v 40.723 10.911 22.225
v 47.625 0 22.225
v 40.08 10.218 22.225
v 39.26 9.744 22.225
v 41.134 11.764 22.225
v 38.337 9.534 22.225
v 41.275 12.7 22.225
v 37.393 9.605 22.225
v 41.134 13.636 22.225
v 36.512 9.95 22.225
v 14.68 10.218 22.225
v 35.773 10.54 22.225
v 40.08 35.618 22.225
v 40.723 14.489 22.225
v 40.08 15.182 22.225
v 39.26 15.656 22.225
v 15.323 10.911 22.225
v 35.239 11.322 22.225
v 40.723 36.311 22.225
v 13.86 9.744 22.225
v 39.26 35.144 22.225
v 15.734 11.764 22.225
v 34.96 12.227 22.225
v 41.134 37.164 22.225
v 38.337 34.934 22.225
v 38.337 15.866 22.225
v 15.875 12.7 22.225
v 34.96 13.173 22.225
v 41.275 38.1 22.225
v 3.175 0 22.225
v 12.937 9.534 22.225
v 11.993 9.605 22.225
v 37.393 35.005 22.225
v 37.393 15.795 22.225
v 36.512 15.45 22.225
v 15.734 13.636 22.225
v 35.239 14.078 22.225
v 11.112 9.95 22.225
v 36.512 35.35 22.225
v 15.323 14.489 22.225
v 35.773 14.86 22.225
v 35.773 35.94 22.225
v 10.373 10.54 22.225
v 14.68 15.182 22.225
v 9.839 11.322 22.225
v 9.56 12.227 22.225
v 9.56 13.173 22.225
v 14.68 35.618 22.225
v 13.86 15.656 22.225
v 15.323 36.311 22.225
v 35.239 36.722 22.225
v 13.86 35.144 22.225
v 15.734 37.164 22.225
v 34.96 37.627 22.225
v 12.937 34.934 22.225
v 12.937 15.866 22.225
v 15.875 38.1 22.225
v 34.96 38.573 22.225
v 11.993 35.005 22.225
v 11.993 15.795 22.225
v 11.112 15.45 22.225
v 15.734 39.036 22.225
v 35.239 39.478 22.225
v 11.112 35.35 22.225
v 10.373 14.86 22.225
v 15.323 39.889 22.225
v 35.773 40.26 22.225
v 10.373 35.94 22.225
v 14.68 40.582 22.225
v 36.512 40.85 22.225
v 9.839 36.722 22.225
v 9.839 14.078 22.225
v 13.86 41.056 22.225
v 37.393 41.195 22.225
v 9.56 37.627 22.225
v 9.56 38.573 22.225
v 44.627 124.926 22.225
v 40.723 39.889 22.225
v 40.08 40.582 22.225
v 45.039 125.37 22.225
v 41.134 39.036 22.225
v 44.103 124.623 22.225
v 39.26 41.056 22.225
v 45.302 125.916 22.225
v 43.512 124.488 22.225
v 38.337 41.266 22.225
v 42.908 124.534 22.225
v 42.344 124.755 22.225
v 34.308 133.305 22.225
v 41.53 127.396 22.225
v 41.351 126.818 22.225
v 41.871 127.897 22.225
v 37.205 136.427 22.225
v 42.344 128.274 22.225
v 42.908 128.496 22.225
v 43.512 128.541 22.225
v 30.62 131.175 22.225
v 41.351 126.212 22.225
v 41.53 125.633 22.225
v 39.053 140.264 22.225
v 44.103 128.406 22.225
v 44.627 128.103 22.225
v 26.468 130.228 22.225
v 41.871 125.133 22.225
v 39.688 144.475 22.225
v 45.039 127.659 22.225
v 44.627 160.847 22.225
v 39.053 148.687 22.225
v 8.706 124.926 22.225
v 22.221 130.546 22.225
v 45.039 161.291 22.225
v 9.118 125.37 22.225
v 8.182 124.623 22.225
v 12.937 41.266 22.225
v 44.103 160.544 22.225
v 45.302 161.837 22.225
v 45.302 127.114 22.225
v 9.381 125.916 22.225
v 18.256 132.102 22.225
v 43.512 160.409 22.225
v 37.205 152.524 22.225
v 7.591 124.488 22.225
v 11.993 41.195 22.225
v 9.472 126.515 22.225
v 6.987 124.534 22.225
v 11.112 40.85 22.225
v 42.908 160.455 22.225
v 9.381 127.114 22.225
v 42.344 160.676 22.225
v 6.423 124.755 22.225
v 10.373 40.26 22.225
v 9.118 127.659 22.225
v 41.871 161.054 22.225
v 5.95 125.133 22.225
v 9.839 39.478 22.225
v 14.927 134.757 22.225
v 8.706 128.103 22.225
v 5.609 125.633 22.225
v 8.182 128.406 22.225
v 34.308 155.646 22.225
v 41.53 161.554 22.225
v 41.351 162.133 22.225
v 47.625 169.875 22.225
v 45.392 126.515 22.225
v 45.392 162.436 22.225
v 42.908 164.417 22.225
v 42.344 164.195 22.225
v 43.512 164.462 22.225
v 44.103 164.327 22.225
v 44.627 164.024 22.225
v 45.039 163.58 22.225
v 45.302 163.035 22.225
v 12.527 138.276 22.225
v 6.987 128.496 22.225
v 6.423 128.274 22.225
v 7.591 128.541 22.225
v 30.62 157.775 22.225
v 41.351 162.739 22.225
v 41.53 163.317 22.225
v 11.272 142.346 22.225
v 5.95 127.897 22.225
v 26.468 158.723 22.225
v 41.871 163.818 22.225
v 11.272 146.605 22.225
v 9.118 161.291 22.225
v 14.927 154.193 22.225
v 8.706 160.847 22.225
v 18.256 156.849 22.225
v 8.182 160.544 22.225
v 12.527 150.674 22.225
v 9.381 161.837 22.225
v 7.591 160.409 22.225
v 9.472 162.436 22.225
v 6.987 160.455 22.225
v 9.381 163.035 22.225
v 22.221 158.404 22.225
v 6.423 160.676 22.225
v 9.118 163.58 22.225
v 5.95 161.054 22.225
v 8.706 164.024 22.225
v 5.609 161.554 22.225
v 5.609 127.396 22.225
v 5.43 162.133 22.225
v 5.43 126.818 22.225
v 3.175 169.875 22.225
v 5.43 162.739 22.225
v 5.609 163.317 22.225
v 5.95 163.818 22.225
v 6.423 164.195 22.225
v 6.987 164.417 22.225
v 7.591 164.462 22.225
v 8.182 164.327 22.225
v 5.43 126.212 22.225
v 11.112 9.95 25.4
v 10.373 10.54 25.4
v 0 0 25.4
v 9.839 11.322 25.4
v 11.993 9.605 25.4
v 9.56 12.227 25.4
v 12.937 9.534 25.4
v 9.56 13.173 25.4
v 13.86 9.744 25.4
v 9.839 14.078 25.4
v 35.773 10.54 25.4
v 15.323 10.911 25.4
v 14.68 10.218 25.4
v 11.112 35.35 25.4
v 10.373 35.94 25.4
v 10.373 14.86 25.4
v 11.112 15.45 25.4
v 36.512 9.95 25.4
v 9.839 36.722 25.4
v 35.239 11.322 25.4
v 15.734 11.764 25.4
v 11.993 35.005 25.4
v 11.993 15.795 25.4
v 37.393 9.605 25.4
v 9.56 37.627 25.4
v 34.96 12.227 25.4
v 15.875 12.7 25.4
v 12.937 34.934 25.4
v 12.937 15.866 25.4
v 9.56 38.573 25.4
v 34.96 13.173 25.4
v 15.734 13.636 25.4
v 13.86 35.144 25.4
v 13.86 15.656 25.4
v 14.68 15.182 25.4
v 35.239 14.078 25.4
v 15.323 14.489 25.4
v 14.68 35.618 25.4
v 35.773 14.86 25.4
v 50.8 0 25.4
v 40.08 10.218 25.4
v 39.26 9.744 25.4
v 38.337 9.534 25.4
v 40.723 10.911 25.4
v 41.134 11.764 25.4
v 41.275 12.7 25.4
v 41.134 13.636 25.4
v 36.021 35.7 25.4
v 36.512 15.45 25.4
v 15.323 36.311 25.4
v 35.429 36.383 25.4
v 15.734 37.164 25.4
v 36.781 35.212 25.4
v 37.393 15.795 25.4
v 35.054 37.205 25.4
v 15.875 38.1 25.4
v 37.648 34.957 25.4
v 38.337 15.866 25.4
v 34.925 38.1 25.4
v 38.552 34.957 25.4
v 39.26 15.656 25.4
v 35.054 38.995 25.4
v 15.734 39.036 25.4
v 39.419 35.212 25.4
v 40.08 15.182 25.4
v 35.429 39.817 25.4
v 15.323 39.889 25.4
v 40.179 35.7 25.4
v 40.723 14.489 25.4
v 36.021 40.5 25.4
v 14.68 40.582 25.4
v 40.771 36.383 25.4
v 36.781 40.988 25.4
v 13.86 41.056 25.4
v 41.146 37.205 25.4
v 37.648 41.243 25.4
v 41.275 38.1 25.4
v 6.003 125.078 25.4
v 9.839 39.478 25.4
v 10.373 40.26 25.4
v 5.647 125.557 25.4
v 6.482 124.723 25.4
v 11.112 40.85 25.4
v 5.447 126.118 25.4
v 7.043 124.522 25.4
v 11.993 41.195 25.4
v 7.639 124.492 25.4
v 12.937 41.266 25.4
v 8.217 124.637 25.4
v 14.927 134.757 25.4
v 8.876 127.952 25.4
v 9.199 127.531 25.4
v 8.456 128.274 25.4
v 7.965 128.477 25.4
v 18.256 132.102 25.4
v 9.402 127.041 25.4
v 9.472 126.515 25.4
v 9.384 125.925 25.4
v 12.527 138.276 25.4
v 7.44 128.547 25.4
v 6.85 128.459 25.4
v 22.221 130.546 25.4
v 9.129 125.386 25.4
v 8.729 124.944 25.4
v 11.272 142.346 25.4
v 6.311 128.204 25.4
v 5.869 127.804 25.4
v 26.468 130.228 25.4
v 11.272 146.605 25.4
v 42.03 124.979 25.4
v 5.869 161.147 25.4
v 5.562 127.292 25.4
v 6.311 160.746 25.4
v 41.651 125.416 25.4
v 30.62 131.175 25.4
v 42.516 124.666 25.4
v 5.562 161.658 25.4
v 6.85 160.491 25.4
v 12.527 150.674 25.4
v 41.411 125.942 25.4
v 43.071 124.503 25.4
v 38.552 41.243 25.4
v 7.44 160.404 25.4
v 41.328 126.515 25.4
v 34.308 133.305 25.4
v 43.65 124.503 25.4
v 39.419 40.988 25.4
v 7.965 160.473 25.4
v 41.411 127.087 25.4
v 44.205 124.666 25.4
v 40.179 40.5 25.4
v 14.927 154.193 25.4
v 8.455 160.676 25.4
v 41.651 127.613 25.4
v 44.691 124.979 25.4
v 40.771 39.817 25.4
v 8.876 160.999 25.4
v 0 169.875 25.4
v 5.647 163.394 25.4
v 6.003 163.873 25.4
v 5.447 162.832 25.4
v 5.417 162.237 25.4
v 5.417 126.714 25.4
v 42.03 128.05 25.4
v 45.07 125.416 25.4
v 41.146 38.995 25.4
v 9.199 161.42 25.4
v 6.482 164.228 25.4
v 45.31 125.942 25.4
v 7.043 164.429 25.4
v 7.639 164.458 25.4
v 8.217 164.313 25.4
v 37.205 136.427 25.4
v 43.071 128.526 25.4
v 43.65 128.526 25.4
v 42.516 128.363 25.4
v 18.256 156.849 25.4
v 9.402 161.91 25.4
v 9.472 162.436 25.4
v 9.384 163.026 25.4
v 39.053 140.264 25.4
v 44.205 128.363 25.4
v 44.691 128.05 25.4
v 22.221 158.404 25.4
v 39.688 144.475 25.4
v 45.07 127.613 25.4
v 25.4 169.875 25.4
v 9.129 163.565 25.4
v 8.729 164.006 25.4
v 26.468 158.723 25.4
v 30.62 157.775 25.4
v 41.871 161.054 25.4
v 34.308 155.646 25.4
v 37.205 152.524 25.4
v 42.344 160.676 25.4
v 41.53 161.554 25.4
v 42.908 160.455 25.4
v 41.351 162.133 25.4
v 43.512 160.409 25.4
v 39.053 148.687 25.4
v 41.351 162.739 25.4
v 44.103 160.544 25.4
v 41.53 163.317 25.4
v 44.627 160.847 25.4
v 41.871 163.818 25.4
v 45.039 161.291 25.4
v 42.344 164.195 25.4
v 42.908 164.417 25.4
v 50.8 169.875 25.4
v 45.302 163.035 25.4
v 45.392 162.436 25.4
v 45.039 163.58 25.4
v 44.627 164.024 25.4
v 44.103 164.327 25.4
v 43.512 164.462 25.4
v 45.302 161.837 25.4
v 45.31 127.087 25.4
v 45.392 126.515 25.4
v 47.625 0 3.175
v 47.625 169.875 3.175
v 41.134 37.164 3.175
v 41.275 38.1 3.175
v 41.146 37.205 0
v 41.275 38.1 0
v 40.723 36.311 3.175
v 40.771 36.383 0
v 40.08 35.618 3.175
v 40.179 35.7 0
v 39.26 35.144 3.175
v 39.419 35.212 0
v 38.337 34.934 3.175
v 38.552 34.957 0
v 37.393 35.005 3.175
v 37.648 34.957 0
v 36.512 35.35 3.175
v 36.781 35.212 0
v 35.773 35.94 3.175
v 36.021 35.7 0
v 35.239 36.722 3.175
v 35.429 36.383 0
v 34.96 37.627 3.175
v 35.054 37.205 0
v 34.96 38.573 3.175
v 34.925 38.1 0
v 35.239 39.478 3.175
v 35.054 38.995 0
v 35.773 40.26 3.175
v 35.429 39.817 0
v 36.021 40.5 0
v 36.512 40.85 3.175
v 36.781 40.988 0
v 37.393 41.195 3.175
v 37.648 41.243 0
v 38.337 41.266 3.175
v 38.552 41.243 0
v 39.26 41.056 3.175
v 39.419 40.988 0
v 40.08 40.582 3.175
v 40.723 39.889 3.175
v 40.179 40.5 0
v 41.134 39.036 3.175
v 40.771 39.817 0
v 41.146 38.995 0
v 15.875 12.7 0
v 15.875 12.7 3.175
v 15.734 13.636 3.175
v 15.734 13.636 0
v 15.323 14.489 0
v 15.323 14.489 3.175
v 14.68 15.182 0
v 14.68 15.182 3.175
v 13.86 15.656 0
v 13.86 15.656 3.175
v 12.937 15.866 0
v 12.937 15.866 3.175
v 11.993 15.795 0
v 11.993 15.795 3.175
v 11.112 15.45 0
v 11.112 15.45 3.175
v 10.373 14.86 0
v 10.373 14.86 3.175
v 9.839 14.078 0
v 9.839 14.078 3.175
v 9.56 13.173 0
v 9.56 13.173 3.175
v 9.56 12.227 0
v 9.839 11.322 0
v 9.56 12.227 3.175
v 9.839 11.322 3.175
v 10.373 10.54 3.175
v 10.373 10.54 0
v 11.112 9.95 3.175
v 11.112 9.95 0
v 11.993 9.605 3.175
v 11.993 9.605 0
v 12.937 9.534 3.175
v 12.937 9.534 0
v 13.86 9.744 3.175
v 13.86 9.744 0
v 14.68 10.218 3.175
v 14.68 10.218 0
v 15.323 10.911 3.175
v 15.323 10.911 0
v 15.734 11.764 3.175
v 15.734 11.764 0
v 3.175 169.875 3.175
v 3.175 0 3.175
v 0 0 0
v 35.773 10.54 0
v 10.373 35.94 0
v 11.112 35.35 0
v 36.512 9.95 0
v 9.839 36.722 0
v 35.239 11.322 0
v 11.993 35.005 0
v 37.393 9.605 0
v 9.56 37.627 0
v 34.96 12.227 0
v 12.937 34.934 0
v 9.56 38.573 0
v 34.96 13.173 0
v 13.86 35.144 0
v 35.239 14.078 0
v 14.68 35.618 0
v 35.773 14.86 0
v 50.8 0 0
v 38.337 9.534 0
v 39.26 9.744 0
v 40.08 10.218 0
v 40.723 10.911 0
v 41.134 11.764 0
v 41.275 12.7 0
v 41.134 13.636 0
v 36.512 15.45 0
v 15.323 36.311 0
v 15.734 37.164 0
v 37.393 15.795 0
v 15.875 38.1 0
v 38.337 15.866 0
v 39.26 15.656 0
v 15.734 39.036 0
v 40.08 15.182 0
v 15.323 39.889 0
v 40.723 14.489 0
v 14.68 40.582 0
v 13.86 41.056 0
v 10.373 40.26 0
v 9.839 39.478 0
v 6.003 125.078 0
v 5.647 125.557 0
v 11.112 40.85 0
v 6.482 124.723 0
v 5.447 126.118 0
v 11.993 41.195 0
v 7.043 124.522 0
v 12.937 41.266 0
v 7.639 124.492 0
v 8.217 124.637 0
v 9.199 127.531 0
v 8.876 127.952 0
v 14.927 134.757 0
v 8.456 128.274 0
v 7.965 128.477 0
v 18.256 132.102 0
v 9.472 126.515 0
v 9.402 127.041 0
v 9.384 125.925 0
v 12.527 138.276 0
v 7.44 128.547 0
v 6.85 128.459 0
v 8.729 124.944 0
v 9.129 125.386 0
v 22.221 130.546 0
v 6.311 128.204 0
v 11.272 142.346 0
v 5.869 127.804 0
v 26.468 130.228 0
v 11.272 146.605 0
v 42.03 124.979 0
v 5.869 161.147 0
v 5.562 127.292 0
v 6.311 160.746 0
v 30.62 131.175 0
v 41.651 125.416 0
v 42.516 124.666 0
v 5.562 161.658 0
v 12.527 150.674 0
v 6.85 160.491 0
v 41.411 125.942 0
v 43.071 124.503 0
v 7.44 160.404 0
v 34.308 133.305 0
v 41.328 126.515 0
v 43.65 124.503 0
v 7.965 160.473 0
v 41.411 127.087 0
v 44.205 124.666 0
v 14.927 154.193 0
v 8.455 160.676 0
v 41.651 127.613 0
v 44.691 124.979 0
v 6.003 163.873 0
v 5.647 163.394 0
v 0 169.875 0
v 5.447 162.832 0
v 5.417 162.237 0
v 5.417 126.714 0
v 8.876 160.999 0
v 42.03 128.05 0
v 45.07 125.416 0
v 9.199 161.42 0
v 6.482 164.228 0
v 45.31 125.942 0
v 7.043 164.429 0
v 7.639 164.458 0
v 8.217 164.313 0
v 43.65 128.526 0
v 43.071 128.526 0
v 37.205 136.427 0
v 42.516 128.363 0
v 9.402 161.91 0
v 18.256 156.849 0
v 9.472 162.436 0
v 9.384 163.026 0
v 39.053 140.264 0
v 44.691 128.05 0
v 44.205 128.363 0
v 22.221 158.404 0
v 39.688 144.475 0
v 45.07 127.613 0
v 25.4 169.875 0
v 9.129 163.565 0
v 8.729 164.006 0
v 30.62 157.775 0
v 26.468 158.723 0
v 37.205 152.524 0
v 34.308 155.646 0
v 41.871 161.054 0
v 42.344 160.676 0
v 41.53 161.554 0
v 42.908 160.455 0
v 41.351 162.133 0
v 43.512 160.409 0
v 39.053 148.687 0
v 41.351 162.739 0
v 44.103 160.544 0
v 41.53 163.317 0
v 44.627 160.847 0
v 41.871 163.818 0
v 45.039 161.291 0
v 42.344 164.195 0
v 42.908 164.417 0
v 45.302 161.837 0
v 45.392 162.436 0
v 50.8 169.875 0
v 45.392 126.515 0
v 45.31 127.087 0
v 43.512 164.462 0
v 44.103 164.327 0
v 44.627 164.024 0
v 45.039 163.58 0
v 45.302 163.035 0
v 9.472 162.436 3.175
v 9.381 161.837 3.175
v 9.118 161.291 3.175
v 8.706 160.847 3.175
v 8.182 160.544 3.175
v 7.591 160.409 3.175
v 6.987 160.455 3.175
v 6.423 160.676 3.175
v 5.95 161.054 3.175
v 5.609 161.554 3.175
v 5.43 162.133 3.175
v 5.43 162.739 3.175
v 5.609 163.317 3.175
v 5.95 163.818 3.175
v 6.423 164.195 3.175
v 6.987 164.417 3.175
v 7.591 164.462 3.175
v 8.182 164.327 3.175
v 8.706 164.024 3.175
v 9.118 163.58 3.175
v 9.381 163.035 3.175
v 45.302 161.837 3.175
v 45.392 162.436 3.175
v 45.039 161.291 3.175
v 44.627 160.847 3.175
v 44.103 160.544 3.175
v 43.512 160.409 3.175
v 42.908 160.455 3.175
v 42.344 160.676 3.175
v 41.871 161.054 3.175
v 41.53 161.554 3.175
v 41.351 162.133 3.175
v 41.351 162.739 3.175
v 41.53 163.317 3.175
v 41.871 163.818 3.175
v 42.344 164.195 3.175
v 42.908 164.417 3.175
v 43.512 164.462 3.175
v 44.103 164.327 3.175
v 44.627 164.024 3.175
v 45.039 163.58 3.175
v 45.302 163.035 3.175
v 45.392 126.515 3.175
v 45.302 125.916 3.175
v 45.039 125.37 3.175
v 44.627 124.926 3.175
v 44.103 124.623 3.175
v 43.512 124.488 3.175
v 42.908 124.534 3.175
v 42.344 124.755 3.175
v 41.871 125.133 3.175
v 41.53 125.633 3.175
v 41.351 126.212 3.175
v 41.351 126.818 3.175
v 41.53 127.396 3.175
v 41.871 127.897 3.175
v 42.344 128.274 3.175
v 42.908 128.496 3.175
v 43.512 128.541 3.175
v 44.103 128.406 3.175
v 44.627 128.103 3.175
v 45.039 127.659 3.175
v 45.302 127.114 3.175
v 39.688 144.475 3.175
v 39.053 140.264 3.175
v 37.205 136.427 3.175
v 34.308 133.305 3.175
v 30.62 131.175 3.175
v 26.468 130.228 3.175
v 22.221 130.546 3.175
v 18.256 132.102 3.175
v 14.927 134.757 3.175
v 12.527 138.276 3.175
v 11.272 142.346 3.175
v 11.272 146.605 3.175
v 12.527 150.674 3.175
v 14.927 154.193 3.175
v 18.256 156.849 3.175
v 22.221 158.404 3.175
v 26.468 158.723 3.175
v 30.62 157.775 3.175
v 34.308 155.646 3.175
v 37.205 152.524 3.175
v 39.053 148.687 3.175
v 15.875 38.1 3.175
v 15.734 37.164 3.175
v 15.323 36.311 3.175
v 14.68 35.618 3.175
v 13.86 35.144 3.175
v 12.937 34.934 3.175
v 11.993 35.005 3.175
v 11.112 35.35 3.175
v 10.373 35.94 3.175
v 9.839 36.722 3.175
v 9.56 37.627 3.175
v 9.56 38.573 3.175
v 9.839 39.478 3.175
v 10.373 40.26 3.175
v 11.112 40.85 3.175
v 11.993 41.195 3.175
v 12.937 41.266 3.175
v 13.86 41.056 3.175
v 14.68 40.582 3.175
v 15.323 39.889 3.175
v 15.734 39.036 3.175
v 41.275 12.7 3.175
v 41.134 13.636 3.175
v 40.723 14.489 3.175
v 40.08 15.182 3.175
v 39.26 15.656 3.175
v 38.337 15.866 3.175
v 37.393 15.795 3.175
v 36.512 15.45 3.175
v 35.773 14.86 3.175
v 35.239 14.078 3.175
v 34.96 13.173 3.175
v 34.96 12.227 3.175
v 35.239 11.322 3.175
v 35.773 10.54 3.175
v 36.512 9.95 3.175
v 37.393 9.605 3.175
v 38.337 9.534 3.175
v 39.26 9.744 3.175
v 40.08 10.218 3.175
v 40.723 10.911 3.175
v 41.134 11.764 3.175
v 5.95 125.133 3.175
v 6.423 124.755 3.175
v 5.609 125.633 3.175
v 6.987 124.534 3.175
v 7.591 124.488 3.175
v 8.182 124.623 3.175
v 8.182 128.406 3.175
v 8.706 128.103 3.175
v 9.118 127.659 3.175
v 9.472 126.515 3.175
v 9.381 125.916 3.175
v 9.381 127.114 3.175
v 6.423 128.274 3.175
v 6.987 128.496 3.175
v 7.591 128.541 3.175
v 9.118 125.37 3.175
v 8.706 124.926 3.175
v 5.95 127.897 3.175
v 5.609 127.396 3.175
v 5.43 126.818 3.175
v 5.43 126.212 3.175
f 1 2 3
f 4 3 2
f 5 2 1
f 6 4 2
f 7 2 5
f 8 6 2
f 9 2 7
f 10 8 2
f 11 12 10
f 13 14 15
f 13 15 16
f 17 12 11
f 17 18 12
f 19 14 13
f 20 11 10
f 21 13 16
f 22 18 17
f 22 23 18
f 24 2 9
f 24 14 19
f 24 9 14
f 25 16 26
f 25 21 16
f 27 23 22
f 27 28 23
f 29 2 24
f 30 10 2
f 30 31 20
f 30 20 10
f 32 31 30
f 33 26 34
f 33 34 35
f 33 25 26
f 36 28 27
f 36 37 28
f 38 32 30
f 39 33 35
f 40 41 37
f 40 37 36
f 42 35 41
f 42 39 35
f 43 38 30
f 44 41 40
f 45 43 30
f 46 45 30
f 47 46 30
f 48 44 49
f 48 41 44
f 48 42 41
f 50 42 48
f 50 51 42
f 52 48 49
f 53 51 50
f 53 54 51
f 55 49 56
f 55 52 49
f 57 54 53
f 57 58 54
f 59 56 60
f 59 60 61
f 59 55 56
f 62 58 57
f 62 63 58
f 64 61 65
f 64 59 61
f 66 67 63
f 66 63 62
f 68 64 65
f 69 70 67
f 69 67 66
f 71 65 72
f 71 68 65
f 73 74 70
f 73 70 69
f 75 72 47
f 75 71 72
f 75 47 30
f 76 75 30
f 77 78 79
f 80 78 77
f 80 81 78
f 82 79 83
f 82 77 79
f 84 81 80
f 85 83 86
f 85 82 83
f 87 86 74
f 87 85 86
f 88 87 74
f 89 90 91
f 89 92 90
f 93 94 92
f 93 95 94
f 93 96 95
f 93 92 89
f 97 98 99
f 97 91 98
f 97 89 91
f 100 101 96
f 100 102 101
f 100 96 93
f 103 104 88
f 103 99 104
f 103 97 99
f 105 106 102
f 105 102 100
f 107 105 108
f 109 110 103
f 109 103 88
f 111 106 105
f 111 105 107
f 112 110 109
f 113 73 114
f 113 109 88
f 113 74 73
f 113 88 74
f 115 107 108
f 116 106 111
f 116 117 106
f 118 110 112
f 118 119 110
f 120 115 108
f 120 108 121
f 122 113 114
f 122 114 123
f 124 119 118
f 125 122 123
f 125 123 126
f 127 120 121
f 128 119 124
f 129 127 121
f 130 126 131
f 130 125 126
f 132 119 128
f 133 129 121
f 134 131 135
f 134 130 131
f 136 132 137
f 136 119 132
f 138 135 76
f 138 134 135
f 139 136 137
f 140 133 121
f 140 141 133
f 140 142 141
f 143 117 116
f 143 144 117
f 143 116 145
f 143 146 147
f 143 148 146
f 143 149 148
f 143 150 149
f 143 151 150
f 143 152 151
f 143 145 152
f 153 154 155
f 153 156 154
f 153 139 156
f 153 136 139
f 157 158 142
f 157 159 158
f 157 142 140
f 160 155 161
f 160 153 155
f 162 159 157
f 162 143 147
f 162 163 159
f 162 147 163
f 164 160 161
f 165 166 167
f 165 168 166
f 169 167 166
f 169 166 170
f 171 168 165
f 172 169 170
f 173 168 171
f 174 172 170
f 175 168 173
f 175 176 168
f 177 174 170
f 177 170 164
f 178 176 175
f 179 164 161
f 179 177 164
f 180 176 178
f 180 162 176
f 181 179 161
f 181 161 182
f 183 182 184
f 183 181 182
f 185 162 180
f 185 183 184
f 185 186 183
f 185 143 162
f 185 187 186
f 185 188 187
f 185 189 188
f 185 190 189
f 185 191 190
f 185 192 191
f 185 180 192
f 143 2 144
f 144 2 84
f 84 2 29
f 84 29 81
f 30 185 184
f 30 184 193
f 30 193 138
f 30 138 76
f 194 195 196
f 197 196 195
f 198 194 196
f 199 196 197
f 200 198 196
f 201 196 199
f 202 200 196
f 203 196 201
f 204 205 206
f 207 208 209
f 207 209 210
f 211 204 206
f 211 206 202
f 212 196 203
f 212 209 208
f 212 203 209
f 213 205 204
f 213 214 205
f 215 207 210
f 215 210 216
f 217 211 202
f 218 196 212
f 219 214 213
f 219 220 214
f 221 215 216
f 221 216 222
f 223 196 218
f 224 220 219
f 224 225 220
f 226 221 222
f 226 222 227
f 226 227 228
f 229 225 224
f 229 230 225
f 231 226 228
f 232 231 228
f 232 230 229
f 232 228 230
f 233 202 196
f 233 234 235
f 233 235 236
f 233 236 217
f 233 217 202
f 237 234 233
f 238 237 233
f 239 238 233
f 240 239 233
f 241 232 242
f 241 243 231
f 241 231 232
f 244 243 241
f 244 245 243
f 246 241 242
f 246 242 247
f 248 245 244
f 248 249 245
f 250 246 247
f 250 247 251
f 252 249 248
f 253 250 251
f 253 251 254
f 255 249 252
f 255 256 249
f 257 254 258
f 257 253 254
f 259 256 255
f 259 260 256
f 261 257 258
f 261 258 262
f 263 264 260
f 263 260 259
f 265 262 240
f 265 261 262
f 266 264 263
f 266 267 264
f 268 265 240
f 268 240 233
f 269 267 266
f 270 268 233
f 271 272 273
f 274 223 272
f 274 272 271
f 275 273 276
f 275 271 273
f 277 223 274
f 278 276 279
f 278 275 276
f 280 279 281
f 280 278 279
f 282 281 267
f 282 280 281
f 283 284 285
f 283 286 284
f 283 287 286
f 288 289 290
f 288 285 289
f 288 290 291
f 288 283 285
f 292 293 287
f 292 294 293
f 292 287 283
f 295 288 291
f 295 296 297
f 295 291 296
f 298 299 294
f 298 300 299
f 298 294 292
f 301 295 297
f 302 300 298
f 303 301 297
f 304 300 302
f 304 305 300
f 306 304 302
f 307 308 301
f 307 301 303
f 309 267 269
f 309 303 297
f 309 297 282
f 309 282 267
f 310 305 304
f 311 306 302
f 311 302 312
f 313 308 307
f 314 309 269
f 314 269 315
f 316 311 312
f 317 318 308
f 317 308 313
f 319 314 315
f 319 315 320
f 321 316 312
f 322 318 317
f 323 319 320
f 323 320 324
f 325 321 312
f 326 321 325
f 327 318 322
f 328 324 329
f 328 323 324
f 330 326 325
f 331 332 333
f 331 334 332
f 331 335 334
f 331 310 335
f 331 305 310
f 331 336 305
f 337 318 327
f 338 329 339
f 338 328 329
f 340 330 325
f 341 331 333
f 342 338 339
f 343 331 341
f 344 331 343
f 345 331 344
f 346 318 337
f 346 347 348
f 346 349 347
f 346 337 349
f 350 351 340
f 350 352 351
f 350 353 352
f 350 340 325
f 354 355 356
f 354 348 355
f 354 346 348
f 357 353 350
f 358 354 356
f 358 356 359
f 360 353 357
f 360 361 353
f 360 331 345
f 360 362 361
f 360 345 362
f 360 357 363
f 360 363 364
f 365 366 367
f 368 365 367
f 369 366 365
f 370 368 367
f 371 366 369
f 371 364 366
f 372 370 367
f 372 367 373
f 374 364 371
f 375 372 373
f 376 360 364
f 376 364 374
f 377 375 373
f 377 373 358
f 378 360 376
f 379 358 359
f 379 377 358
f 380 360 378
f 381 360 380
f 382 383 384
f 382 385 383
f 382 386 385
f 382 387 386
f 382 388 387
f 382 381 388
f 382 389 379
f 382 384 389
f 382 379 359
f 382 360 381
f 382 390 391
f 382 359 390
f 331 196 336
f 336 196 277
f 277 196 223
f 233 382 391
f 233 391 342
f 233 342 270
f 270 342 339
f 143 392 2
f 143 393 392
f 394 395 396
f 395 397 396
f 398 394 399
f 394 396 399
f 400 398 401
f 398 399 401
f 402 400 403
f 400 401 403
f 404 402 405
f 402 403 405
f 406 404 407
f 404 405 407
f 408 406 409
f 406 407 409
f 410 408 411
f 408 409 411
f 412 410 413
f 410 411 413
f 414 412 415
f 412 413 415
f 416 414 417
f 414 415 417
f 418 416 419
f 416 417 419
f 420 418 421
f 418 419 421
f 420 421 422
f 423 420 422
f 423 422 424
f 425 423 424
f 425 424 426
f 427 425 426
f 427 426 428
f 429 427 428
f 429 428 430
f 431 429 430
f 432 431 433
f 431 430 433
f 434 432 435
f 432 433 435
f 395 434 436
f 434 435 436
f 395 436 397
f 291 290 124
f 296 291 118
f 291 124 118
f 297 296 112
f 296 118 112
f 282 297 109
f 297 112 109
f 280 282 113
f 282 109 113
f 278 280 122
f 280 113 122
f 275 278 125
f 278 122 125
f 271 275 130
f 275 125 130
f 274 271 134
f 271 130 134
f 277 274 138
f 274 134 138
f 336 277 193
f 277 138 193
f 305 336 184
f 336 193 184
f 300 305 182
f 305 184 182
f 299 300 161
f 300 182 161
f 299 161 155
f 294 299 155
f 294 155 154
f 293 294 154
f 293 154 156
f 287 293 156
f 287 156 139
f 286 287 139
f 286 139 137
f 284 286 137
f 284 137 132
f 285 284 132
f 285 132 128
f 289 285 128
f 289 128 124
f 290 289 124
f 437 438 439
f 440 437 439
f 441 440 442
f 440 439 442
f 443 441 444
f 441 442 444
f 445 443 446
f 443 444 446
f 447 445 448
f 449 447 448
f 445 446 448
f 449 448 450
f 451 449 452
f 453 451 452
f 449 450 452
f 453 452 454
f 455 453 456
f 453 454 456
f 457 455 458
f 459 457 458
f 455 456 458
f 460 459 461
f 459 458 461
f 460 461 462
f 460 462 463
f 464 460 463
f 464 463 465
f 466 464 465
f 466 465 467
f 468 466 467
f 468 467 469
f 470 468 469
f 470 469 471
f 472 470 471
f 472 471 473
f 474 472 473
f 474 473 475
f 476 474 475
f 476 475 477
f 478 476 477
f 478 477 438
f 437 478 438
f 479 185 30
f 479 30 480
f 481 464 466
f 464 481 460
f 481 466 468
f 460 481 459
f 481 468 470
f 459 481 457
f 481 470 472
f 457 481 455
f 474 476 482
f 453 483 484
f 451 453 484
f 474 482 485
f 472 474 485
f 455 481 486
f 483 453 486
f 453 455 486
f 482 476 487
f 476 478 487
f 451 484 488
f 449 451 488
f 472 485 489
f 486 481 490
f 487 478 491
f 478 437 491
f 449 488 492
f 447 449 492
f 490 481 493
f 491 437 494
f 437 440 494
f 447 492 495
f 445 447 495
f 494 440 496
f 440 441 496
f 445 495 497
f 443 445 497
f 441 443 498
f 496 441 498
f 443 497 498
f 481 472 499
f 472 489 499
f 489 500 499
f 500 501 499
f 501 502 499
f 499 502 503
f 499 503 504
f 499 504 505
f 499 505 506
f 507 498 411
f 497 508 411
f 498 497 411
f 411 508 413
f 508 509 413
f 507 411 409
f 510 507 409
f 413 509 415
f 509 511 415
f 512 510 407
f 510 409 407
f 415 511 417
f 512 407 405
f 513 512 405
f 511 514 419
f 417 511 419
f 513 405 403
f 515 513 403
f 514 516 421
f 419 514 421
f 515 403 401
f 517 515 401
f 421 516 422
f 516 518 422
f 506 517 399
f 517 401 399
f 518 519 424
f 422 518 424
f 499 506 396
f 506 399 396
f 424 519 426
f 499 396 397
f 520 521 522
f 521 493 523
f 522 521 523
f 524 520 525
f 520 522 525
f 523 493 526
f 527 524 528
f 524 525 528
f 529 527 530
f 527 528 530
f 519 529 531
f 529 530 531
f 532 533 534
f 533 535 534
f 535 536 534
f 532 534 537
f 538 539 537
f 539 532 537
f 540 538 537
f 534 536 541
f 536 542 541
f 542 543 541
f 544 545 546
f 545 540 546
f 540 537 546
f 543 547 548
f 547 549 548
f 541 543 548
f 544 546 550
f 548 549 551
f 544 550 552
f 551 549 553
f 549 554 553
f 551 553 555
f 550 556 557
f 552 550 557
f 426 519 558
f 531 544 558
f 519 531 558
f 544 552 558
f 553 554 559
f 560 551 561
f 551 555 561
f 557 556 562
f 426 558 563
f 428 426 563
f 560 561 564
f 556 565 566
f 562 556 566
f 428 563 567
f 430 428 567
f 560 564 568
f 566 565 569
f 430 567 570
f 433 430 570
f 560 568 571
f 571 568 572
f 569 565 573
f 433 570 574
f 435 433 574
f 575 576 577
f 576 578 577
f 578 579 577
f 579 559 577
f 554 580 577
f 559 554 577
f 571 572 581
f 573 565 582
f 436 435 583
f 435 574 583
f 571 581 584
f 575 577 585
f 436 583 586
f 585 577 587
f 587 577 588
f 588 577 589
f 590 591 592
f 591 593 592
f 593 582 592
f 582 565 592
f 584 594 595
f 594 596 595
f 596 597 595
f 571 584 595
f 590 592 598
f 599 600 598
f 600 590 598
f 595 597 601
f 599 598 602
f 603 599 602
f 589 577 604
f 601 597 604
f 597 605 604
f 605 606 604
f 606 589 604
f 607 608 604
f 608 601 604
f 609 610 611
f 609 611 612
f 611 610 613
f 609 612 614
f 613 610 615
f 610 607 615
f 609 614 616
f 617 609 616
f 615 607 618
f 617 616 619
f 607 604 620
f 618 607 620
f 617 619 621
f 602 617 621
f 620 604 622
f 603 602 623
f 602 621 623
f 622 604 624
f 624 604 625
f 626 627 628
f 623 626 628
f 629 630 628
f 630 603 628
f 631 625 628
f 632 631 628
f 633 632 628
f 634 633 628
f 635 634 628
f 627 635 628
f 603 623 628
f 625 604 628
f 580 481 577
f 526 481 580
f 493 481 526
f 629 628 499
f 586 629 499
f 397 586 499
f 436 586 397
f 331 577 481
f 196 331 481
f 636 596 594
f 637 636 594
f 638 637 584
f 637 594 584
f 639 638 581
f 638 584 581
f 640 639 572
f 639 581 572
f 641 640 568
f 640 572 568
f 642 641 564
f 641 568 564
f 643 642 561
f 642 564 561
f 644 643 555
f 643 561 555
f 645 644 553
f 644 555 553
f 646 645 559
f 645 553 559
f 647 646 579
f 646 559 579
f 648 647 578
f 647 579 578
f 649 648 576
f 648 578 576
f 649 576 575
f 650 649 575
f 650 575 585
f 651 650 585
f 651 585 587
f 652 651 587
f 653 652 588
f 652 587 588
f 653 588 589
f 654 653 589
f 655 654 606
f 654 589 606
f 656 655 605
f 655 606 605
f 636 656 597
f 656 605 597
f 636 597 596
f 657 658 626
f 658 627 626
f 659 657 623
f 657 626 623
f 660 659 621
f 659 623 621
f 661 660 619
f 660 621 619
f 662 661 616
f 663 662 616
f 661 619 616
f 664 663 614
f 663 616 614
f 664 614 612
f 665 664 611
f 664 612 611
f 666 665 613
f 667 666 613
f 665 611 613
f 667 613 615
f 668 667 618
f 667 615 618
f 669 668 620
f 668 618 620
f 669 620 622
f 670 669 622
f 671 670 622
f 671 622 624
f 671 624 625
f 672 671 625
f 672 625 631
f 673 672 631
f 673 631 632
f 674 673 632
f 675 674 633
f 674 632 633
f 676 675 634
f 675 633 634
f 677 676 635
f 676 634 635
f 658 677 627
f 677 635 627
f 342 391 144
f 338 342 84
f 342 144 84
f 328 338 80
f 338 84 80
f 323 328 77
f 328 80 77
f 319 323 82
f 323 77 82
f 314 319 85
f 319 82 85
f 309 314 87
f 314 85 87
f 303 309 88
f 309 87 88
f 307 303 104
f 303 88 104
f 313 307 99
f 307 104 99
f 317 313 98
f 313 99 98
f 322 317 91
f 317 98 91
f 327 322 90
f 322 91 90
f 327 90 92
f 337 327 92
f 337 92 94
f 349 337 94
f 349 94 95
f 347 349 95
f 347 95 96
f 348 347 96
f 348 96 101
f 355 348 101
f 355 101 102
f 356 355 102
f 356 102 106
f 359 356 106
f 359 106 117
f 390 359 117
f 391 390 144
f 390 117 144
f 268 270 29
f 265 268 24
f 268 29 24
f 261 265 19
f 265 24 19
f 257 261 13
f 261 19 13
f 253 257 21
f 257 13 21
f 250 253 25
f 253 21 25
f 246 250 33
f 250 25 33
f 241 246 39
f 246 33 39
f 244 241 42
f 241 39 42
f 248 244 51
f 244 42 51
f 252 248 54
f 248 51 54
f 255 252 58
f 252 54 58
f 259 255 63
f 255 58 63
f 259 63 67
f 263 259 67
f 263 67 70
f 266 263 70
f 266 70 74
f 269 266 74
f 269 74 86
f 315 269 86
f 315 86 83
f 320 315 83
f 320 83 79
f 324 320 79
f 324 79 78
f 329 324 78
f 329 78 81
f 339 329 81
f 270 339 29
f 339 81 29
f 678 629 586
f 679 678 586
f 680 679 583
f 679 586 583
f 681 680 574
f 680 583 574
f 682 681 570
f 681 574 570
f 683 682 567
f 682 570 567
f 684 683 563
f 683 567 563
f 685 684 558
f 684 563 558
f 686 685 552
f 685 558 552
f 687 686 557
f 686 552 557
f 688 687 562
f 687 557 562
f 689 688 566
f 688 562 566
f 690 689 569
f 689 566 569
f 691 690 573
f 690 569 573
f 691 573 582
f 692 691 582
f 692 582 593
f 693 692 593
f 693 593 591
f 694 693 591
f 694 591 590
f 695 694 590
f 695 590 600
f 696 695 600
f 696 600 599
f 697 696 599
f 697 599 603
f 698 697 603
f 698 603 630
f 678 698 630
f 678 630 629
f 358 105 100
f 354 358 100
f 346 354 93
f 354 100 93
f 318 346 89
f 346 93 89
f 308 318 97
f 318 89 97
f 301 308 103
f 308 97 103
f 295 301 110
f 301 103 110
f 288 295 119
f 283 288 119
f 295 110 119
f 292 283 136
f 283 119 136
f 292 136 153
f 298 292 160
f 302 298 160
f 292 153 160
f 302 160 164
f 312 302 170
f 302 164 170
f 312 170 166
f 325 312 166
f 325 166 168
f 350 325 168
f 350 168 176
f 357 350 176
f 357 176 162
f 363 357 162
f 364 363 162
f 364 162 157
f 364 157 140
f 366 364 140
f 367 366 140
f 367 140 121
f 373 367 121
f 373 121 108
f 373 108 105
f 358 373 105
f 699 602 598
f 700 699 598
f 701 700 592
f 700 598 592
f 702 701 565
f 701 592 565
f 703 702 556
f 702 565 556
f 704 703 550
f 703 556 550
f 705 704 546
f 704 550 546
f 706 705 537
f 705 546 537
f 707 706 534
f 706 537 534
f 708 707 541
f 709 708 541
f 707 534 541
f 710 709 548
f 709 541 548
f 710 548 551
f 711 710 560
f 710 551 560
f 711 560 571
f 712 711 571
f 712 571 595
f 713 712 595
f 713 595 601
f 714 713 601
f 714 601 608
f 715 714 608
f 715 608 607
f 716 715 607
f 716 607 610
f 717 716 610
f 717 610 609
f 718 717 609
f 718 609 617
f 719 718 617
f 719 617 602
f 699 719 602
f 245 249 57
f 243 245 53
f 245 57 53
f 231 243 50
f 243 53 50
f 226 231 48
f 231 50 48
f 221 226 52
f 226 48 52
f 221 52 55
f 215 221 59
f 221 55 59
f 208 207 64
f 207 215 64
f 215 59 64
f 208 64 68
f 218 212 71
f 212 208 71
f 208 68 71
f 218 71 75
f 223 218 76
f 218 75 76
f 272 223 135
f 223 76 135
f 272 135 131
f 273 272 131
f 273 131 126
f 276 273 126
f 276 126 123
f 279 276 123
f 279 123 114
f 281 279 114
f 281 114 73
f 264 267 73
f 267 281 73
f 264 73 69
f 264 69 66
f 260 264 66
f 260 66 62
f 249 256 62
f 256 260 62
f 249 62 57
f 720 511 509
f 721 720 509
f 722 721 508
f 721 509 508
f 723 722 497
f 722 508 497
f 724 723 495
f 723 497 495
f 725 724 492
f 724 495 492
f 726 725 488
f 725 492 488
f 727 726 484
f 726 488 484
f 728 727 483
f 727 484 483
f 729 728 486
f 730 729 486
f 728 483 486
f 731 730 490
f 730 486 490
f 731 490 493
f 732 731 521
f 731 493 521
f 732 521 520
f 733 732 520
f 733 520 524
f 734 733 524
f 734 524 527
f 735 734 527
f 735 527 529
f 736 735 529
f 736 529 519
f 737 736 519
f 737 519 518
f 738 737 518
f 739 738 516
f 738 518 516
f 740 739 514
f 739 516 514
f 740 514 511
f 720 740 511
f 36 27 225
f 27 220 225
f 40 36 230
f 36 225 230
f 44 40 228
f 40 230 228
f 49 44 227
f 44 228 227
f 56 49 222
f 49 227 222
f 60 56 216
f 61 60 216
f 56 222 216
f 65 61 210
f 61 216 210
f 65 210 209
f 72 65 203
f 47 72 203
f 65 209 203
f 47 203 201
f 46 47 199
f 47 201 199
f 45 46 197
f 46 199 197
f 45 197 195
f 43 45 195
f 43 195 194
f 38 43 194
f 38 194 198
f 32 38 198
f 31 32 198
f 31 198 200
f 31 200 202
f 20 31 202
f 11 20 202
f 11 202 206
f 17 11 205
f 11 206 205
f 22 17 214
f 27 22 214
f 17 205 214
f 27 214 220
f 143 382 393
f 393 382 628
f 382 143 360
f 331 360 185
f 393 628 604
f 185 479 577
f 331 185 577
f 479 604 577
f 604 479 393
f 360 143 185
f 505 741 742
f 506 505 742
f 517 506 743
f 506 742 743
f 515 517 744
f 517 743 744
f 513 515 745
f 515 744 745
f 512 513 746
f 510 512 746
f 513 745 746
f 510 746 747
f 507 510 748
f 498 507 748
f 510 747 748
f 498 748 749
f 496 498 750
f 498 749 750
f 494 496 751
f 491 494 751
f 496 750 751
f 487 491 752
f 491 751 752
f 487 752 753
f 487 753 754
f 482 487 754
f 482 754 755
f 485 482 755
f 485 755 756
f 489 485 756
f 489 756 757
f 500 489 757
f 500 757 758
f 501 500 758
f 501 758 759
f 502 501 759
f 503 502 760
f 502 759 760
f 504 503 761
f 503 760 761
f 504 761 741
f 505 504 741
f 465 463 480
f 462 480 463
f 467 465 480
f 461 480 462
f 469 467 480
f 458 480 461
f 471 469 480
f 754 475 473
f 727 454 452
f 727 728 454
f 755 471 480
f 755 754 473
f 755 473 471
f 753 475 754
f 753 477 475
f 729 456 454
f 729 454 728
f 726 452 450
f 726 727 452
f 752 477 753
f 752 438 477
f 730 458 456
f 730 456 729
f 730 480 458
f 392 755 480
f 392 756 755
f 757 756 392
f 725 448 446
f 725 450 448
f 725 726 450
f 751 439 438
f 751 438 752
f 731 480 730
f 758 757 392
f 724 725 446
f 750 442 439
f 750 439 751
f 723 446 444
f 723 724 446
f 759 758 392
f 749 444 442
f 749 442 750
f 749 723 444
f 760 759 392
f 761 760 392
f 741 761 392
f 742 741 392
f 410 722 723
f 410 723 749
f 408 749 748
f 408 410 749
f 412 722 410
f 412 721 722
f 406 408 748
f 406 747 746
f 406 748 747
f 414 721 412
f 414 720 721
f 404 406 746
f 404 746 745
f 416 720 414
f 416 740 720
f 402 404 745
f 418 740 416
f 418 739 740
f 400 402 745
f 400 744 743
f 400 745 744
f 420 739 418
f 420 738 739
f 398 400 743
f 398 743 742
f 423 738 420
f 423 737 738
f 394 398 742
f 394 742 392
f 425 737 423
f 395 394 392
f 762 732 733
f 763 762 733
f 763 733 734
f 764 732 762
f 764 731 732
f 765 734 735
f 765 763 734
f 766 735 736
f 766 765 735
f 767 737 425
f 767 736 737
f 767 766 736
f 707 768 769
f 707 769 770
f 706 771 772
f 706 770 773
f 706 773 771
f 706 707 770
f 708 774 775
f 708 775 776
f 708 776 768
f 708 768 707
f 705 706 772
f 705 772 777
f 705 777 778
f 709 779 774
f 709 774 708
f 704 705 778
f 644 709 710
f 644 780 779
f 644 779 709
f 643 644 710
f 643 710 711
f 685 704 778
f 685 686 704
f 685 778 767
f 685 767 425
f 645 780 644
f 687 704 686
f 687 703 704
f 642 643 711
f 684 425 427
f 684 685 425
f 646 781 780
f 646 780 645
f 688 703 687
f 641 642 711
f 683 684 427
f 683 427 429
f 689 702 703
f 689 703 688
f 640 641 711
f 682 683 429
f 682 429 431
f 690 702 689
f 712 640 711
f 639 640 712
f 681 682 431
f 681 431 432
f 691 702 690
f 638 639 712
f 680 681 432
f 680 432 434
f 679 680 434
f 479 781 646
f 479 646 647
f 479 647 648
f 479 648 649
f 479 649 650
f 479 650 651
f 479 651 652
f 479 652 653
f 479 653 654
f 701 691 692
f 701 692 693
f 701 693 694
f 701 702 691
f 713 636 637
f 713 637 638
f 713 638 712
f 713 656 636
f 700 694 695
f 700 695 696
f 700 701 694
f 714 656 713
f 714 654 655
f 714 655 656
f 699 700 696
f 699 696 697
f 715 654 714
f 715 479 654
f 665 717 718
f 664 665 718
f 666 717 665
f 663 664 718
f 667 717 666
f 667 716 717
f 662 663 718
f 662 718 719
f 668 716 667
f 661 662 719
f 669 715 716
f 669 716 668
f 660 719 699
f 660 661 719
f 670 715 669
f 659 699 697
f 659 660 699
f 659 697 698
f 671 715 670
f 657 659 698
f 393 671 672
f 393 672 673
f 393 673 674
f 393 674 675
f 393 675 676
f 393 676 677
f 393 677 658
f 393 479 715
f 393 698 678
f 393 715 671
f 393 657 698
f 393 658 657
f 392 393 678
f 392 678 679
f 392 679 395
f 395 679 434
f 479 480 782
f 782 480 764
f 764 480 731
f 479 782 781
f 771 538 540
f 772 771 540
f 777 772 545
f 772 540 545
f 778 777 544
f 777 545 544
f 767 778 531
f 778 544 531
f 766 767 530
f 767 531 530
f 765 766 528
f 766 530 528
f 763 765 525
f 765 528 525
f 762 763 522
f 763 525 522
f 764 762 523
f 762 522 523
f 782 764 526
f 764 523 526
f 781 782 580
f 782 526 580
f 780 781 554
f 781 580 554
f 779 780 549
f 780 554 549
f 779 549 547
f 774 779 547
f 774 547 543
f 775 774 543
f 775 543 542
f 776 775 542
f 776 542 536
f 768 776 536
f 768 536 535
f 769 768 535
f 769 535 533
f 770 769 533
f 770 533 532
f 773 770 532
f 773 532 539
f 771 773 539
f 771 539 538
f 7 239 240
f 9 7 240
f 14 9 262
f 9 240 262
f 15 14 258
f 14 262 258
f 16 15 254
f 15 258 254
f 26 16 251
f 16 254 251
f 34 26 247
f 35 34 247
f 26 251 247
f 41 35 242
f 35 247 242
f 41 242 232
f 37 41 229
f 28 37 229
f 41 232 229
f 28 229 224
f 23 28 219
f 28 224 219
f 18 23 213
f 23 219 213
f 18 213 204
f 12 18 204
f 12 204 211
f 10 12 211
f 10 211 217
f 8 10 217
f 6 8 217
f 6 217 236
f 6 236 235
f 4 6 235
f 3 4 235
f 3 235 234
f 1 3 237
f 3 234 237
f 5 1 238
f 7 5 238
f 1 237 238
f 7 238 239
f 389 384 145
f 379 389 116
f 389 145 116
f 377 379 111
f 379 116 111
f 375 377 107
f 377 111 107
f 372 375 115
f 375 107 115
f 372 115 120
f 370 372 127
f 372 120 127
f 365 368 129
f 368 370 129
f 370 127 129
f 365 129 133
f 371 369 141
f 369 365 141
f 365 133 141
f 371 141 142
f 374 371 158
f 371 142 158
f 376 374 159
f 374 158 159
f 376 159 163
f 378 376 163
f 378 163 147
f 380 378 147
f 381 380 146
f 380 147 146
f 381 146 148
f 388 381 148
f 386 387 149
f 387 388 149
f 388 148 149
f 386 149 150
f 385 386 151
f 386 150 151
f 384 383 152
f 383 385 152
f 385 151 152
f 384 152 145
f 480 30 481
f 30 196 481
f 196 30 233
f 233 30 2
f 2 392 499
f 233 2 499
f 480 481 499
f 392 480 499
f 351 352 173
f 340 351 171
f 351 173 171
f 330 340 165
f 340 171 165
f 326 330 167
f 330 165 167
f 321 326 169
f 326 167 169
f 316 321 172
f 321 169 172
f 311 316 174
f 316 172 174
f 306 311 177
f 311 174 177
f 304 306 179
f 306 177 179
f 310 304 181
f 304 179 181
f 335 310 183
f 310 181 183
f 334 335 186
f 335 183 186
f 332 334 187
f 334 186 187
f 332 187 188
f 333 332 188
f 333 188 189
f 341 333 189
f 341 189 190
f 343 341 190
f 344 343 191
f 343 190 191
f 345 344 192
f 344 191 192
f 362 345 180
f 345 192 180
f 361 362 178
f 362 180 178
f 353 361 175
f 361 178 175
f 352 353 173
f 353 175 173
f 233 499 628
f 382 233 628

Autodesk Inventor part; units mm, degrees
ref_plane "YZ Plane" through (0, 0, 0) normal (1, 0, 0) x (0, 1, 0)
ref_plane "XZ Plane" through (0, 0, 0) normal (0, 1, 0) x (-1, 0, 0)
ref_plane "XY Plane" through (0, 0, 0) normal (0, 0, 1) x (1, 0, 0)
sketch "Sketch1" plane through (0, 0, 0) normal (0, 0, 1) x (1, 0, 0)
  line L0 (0, 0) -> (50.8, 0)
  line L1 (50.8, 0) -> (50.8, 169.8752)
  line L2 (50.8, 169.8752) -> (0, 169.8752)
  line L3 (0, 169.8752) -> (0, 0)
  line L4 (25.4, 169.8752) -> (25.4, 144.4752)
  line L5 (25.4, 169.8752) -> (50.8, 169.8752) construction
  circle A0 centre (25.4, 144.4752) radius 14.2875
  line L6 (25.4, 144.4752) -> (43.3605, 162.4357)
  line L7 (25.4, 144.4752) -> (50.8, 144.4752) construction
  line L8 (7.4395, 126.5147) -> (43.3605, 126.5147)
  line L9 (43.3605, 162.4357) -> (7.4395, 162.4357)
  line L10 (7.4395, 162.4357) -> (7.4395, 126.5147)
  circle A1 centre (7.4395, 162.4357) radius 2.032
  circle A2 centre (7.4395, 126.5147) radius 2.032
  circle A3 centre (43.3605, 162.4357) radius 2.032
  circle A4 centre (43.3605, 126.5147) radius 2.032
  line L11 (0, 0) -> (50.8, 0)
  line L12 (50.8, 0) -> (50.8, 38.1)
  line L13 (0, 38.1) -> (0, 0)
  line L14 (25.4, 38.1) -> (12.7, 38.1)
  line L15 (25.4, 38.1) -> (38.1, 38.1) construction
  line L16 (12.7, 38.1) -> (38.1, 38.1)
  circle A5 centre (12.7, 38.1) radius 3.175
  circle A6 centre (38.1, 38.1) radius 3.175
  dimension "d0" = 50.8
  dimension "d1" = 169.8752
  dimension "d2" = 25.4
  dimension "d3" = 90
  dimension "d4" = 28.575
  dimension "d5" = 25.4
  dimension "d6" = 45
  dimension "d7" = 50.8
  dimension "d9" = 4.064
  dimension "d10" = 4.064
  dimension "d11" = 4.064
  dimension "d12" = 4.064
  dimension "d13" = 50.8
  dimension "d14" = 38.1
  dimension "d15" = 12.7
  dimension "d16" = 180
  dimension "d17" = 25.4
  dimension "d18" = 0
  dimension "d19" = 6.35
  dimension "d20" = 6.35
extrude "Extrusion1" add sketch "Sketch1" along normal blind 25.4 contours L9 A3 L6 A0 L4 | L3 L2 L1 L0
sketch "Sketch2" plane through (0, 169.8752, 0) normal (0, 1, 0) x (1, 0, 0)
  line L0 (0, 0) -> (3.175, 0)
  line L1 (3.175, 0) -> (3.175, -3.175)
  line L2 (3.175, -3.175) -> (0, -3.175)
  line L3 (0, -3.175) -> (0, 0)
  line L4 (3.175, -3.175) -> (47.625, -3.175)
  line L5 (47.625, -3.175) -> (47.625, -22.225)
  line L6 (47.625, -22.225) -> (3.175, -22.225)
  line L7 (3.175, -22.225) -> (3.175, -3.175)
  dimension "d23" = 3.175
  dimension "d24" = 3.175
  dimension "d25" = 44.45
  dimension "d26" = 19.05
extrude "Extrusion2" cut sketch "Sketch2" against normal blind 254 contours L4 L5 L6 L7
sketch "Sketch3" plane through (0, 0, 25.4) normal (0, 0, 1) x (1, 0, 0)
  circle A0 centre (12.7, 38.1) radius 3.175 projected
  line L0 (12.7, 38.1) -> (38.1, 38.1)
  line L1 (38.1, 38.1) -> (38.1, 12.7)
  line L2 (38.1, 12.7) -> (12.7, 12.7)
  line L3 (12.7, 12.7) -> (12.7, 38.1)
  circle A1 centre (12.7, 12.7) radius 3.175
  circle A2 centre (38.1, 12.7) radius 3.175
  dimension "d29" = 25.4
  dimension "d30" = 25.4
  dimension "d31" = 6.35
  dimension "d32" = 6.35
extrude "Extrusion3" cut sketch "Sketch3" against normal blind 25.4 contours A1 L2 L3 | L3 L2 A1 | A2 L2 L1 | L1 L2 A2
properties part number "Z-Bar"
